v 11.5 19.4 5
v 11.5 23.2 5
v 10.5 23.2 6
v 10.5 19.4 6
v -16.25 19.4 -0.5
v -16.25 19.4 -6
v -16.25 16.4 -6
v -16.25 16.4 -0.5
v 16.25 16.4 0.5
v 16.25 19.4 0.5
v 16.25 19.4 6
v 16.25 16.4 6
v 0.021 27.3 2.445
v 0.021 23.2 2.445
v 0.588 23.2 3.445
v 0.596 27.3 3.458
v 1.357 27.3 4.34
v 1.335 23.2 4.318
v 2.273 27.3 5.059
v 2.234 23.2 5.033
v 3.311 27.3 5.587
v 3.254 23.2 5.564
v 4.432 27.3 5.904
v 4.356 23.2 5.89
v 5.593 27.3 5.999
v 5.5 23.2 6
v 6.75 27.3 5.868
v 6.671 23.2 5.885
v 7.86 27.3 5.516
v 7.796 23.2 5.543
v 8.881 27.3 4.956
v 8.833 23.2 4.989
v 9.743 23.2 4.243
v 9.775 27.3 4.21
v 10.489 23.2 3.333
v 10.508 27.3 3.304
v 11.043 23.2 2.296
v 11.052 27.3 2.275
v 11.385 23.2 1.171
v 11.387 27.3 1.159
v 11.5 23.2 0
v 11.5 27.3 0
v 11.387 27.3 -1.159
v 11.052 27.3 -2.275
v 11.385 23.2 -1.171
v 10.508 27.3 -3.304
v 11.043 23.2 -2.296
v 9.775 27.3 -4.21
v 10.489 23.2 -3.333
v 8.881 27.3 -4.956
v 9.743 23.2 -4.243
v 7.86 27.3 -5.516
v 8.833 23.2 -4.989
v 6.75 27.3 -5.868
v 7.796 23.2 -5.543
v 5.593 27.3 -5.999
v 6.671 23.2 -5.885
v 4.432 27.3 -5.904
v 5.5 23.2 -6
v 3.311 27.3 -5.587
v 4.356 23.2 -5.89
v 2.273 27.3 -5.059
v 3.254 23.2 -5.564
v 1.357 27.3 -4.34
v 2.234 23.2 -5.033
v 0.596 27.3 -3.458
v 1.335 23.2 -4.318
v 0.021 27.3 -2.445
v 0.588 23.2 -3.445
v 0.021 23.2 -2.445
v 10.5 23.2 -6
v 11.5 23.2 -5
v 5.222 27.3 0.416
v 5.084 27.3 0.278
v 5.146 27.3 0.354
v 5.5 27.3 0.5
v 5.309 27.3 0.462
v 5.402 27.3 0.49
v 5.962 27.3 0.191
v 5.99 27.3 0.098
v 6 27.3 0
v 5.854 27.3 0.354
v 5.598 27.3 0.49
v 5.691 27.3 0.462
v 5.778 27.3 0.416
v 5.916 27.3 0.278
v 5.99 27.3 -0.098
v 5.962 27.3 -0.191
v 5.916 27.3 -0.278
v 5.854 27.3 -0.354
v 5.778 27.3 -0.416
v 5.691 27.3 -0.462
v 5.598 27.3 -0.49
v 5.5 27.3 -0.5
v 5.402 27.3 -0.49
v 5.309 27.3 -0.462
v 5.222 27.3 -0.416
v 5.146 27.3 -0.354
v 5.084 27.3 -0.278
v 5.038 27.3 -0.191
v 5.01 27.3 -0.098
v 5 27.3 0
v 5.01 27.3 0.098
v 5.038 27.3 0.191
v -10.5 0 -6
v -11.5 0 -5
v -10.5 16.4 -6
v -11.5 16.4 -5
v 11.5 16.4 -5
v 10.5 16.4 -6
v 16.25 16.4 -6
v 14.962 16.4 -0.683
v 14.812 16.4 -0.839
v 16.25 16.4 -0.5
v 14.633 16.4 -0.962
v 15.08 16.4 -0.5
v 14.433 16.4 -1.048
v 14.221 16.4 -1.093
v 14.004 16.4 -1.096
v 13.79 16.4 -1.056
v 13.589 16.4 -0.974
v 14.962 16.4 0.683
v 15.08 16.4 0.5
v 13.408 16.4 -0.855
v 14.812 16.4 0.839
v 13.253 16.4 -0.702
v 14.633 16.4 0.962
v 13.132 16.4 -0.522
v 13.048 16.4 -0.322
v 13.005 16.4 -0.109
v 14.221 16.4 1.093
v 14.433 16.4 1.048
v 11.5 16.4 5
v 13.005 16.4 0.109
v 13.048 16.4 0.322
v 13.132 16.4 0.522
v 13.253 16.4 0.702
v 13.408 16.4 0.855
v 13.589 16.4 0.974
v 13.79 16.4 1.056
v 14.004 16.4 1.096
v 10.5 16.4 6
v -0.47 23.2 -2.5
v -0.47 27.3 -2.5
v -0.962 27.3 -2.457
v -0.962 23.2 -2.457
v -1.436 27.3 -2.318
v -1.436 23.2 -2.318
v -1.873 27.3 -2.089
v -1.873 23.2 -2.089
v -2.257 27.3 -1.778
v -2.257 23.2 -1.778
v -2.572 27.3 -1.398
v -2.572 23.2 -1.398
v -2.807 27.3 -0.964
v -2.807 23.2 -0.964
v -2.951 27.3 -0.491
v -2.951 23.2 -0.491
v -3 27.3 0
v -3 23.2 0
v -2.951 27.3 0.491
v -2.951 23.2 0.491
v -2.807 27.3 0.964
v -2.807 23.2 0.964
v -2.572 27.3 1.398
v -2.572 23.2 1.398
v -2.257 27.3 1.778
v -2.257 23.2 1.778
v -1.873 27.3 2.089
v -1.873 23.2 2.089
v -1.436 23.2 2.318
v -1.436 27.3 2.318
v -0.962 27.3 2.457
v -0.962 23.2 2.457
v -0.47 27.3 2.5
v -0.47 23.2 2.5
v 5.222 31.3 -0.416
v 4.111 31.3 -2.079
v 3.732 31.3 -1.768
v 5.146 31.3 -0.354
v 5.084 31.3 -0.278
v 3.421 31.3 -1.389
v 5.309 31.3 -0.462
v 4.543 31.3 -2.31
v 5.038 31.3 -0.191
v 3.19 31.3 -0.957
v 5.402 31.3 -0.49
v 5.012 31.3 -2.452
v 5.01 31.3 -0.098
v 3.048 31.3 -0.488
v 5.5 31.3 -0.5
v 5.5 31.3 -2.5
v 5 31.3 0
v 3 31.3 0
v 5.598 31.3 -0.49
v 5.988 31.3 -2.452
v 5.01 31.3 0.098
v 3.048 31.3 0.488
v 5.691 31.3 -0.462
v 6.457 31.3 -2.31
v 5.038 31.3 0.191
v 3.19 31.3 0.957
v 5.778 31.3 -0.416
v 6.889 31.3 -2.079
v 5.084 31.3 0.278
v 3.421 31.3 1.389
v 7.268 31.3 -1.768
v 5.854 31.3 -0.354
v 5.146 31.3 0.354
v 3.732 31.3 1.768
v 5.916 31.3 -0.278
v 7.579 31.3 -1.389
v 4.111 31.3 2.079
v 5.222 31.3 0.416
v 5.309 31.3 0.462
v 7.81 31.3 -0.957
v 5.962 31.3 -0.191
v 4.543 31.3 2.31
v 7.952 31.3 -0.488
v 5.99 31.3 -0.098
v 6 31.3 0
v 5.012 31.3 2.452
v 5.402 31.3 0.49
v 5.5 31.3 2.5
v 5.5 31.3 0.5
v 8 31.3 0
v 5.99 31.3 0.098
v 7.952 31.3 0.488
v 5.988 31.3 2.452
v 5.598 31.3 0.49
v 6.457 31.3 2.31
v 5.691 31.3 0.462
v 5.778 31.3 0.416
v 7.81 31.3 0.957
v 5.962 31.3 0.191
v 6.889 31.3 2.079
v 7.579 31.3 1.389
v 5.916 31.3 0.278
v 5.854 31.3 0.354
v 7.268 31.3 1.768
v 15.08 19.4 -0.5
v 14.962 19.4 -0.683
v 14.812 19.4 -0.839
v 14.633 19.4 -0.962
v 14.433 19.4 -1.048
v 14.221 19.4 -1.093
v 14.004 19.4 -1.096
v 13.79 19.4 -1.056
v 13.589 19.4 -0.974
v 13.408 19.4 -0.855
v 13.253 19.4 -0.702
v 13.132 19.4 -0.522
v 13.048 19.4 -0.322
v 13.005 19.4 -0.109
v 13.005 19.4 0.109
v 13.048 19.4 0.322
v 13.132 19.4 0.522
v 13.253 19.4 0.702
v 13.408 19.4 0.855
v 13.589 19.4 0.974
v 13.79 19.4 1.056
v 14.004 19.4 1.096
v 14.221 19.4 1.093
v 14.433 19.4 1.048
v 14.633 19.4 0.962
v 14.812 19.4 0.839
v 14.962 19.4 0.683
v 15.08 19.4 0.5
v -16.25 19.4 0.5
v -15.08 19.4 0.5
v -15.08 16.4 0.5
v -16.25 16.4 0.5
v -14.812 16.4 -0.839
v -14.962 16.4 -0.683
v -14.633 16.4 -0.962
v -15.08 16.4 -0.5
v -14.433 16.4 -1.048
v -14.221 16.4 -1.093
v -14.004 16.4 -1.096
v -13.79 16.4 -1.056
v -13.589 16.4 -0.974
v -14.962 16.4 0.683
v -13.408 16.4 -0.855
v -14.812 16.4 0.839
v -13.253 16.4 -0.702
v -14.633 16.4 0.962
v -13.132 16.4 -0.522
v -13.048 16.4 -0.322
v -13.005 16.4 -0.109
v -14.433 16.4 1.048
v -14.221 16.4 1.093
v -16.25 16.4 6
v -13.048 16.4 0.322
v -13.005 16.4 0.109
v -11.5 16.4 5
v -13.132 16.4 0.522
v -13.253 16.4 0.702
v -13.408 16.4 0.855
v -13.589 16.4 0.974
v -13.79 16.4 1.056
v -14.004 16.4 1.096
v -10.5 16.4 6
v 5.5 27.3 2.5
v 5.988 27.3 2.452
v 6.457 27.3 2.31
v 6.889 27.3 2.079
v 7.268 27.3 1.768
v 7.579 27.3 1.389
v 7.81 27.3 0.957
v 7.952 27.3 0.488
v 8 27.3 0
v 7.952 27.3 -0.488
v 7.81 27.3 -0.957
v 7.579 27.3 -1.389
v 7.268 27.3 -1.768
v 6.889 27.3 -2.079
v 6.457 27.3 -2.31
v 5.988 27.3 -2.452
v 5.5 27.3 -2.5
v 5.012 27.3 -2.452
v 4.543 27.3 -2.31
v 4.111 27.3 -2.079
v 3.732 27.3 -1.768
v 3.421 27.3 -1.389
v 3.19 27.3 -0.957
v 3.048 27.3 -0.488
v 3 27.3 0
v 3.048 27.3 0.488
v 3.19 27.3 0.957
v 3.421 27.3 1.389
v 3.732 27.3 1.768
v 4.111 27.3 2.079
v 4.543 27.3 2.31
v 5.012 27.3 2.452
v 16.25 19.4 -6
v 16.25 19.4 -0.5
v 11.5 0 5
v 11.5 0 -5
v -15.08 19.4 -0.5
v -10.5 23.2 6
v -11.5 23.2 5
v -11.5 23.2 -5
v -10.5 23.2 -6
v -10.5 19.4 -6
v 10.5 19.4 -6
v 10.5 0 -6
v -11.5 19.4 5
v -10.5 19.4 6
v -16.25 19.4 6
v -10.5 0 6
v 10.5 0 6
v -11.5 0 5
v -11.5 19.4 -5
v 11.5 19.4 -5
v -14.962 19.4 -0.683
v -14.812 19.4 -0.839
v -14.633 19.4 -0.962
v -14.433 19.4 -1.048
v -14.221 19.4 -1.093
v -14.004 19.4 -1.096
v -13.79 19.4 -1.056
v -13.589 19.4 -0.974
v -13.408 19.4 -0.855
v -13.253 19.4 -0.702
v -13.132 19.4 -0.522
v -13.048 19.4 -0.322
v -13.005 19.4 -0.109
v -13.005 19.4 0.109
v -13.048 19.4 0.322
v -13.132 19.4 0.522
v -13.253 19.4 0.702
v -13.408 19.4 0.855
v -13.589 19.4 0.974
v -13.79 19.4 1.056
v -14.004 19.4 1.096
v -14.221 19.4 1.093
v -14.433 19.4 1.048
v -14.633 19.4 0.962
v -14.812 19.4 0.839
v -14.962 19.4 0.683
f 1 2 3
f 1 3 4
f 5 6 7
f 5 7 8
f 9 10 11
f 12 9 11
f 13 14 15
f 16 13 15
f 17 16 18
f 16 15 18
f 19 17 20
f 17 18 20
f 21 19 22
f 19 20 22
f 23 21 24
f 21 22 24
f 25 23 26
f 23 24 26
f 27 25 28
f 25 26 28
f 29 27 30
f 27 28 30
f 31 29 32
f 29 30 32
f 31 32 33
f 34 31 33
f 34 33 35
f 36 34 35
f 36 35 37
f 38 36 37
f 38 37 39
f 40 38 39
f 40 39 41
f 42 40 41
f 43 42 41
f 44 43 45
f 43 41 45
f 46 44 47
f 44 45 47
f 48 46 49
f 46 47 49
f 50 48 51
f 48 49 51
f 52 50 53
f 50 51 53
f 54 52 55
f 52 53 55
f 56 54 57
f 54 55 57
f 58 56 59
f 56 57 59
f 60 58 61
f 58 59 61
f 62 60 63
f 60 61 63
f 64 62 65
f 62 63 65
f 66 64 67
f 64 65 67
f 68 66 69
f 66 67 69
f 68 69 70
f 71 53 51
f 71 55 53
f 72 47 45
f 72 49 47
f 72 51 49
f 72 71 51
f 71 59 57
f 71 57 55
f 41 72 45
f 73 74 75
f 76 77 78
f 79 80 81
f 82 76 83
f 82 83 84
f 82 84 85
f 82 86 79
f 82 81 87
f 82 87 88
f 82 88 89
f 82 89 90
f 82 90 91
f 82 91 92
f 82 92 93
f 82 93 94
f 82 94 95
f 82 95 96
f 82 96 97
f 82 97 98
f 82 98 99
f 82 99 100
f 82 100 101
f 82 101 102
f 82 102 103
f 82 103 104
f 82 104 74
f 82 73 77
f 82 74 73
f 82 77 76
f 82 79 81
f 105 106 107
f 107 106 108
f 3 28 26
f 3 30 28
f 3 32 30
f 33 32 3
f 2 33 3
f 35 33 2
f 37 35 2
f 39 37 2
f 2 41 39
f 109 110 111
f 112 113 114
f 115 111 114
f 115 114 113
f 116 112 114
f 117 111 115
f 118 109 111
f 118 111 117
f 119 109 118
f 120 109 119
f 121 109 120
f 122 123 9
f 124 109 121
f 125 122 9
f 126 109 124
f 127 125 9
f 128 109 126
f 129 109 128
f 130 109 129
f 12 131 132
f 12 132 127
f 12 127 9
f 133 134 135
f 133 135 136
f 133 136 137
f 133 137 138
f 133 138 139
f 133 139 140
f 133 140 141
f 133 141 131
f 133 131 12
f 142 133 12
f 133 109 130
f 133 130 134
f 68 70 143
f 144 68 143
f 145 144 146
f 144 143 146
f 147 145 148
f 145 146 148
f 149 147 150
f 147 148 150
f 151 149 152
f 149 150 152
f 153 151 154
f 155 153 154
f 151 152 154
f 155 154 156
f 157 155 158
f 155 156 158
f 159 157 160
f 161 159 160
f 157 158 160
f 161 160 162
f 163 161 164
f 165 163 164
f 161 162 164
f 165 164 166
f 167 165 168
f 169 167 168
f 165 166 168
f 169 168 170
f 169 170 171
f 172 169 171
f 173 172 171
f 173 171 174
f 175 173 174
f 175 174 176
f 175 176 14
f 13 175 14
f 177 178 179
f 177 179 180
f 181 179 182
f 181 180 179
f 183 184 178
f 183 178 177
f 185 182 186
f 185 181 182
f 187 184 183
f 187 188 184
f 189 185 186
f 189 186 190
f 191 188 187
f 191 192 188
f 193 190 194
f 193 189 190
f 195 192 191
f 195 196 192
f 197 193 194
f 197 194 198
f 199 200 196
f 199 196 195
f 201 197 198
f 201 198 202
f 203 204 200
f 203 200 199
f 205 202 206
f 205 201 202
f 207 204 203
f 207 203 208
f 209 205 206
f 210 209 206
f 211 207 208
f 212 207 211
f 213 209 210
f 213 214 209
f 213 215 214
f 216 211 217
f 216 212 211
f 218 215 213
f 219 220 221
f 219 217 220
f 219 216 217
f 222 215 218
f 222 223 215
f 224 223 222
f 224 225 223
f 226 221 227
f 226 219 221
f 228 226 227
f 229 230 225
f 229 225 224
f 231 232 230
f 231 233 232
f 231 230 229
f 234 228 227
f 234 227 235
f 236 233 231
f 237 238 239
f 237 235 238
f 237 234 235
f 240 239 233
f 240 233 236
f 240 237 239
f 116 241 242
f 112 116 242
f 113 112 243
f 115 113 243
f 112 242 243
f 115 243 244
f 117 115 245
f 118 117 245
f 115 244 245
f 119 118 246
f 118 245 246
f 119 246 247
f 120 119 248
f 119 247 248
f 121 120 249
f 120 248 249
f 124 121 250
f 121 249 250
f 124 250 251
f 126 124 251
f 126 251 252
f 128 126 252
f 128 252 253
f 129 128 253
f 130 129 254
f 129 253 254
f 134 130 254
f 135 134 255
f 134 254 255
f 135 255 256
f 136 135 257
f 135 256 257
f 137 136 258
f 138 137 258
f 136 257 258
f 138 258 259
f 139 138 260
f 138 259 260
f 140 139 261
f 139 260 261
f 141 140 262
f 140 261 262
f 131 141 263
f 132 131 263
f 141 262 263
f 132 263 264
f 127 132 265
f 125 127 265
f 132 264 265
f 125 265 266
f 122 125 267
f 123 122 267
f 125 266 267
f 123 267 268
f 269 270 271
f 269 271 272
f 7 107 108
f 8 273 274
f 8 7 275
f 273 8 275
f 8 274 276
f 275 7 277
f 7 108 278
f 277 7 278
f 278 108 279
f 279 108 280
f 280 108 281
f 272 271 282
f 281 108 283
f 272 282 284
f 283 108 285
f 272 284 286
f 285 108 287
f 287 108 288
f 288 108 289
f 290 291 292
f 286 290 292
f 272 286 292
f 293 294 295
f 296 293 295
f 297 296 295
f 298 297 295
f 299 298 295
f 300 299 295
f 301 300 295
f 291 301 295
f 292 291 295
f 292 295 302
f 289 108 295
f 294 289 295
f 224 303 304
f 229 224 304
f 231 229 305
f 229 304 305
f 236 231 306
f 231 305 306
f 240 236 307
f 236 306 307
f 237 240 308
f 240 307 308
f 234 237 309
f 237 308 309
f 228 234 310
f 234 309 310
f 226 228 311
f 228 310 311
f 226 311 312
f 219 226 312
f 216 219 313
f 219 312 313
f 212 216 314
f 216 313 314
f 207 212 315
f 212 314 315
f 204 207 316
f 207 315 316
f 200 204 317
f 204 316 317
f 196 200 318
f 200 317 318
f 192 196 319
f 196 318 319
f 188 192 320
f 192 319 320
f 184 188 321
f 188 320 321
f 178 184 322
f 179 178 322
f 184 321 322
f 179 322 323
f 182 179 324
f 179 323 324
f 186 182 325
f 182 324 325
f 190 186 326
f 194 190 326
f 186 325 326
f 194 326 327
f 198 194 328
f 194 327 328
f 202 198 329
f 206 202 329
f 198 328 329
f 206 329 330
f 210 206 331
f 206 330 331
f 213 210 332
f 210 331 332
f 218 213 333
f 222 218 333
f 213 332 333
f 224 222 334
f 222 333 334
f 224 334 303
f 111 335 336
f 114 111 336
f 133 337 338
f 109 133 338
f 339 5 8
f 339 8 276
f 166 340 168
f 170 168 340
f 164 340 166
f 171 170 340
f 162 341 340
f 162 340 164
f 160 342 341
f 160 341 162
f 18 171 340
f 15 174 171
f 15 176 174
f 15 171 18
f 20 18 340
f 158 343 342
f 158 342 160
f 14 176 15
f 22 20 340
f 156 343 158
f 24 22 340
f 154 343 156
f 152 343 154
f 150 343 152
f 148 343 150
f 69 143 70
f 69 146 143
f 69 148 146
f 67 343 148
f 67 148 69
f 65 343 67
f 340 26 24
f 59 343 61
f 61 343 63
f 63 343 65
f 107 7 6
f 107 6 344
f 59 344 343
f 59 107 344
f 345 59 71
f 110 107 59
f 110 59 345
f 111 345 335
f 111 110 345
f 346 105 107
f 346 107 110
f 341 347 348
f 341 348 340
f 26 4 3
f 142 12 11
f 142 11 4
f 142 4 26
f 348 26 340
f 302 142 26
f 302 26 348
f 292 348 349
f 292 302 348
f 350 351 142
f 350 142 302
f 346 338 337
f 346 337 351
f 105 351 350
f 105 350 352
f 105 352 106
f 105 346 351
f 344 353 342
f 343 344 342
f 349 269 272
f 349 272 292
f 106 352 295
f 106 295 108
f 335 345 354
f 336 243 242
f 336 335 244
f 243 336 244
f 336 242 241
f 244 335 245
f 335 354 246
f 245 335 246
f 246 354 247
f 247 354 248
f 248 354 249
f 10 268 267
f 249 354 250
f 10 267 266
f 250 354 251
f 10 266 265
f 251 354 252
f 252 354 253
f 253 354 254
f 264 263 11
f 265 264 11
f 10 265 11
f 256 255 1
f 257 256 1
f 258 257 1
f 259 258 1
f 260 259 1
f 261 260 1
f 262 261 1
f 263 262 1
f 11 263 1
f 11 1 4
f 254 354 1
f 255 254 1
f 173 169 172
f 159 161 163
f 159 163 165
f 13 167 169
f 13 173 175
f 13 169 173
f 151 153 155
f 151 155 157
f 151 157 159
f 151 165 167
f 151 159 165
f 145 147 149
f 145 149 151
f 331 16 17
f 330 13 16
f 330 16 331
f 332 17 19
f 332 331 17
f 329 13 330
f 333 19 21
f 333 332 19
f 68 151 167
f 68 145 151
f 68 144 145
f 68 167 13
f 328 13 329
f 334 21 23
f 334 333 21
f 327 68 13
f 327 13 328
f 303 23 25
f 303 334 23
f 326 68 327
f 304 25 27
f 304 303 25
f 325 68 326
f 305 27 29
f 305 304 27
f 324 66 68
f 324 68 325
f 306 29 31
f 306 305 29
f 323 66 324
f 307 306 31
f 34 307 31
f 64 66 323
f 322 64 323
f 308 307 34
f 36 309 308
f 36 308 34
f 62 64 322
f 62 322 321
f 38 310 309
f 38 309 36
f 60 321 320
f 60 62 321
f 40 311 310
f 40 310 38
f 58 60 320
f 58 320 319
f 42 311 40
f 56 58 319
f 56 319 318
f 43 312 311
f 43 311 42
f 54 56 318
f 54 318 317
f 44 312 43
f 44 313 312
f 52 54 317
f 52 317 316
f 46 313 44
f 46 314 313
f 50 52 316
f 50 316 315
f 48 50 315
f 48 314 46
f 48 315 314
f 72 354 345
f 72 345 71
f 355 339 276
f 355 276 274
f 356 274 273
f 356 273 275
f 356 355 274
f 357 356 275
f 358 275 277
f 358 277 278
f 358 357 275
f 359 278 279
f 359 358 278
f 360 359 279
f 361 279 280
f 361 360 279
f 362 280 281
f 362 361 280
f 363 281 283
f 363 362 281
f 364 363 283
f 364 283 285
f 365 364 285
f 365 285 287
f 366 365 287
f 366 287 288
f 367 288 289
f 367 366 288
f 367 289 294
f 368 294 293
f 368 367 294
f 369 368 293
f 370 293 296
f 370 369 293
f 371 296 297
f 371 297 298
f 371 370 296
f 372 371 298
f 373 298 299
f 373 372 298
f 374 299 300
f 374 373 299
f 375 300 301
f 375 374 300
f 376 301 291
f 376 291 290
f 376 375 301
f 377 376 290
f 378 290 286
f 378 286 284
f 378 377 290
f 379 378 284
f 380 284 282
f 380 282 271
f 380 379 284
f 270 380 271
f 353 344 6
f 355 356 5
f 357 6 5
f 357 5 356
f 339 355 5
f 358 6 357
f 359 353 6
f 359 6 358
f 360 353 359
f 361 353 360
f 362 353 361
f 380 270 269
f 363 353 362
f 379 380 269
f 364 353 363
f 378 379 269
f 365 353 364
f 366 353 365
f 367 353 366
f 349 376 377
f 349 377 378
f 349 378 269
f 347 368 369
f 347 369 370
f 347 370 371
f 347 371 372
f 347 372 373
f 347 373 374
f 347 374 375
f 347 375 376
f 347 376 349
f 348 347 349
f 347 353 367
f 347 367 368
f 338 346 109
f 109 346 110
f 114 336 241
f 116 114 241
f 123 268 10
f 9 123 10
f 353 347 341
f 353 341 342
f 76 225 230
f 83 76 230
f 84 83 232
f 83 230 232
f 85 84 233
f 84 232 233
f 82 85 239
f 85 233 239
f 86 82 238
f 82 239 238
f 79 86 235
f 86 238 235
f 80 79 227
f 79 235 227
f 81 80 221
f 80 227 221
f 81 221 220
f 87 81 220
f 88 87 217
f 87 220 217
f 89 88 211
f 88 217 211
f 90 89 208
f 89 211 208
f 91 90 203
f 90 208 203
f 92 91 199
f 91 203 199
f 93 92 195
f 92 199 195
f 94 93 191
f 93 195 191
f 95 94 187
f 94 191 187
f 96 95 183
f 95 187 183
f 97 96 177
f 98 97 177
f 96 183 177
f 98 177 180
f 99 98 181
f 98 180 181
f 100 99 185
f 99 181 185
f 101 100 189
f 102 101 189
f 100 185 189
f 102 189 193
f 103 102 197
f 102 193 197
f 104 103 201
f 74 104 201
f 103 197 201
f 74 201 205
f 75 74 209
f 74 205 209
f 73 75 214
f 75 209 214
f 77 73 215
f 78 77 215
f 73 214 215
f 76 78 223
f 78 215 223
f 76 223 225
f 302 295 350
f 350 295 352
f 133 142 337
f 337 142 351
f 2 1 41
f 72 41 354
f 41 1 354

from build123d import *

# Parameters (mm, degrees)
CROQUIS1_W              = 23
CROQUIS1_H              = 12
SALIENTE_EXTRUIR1_DEPTH = 23.2
CROQUIS6_R              = 2
CORTAR_EXTRUIR1_DEPTH   = 0.5
SALIENTE_EXTRUIR3_DEPTH = 4.1
CROQUIS8_R              = 2.5
SALIENTE_EXTRUIR4_DEPTH = 4
CROQUIS9_R              = 0.5
CORTAR_EXTRUIR2_DEPTH   = 4
CROQUIS11_W             = 12
CROQUIS11_H             = 3
SALIENTE_EXTRUIR5_DEPTH = 4.75
CORTAR_EXTRUIR3_DEPTH   = 3
CHAFL_N3_SIZE           = 1


with BuildPart() as part:
    # Croquis1 → Saliente-Extruir1 (new body)
    with BuildSketch(Plane(origin=(0, 0, 0), x_dir=(1, 0, 0), z_dir=(0, 1, 0))):
        Rectangle(CROQUIS1_W, CROQUIS1_H)
    saliente_extruir1 = extrude(amount=SALIENTE_EXTRUIR1_DEPTH)

    # Croquis6 → Cortar-Extruir1 (cut)
    with BuildSketch(Plane.XZ):
        with Locations((-11.5, 6)):
            Circle(CROQUIS6_R)
        with Locations((11.5, 6)):
            Circle(CROQUIS6_R)
        with Locations((-11.5, -6)):
            Circle(CROQUIS6_R)
        with Locations((11.5, -6)):
            Circle(CROQUIS6_R)
    extrude(amount=-CORTAR_EXTRUIR1_DEPTH, mode=Mode.SUBTRACT)

    # Croquis7 → Saliente-Extruir3 (add)
    with BuildSketch(Plane(origin=(0, 23.2, 0), x_dir=(1, 0, 0), z_dir=(0, 1, 0))):
        with BuildLine():
            ThreePointArc((0.020833333, -2.445144707), (11.5, 0), (0.020833333, 2.445144707))
            ThreePointArc((0.020833333, 2.445144707), (-3, 0), (0.020833333, -2.445144707))
        make_face()
    extrude(amount=SALIENTE_EXTRUIR3_DEPTH)

    # Croquis8 → Saliente-Extruir4 (add)
    with BuildSketch(Plane(origin=(0, 27.3, 0), x_dir=(1, 0, 0), z_dir=(0, 1, 0))):
        with Locations(Location((5.5, 0, 0), (0, 0, 270))):
            Circle(CROQUIS8_R)
    extrude(amount=SALIENTE_EXTRUIR4_DEPTH)

    # Croquis9 → Cortar-Extruir2 (cut)
    with BuildSketch(Plane(origin=(0, 31.3, 0), x_dir=(1, 0, 0), z_dir=(0, 1, 0))):
        with Locations(Location((5.5, 0, 0), (0, 0, 270))):
            Circle(CROQUIS9_R)
    extrude(amount=-CORTAR_EXTRUIR2_DEPTH, mode=Mode.SUBTRACT)

    # Croquis11 → Saliente-Extruir5 (add)
    with BuildSketch(Plane.ZY.offset(11.5)):
        with Locations((0, 17.89988551)):
            Rectangle(CROQUIS11_W, CROQUIS11_H)
    saliente_extruir5 = extrude(amount=SALIENTE_EXTRUIR5_DEPTH)

    # Croquis12 → Cortar-Extruir3 (cut)
    with BuildSketch(Plane(origin=(0, 19.39988551, 0), x_dir=(1, 0, 0), z_dir=(0, 1, 0))):
        with BuildLine():
            Line((-16.25, 0.5), (-15.079795897, 0.5))
            ThreePointArc((-15.079795897, 0.5), (-13, 0), (-15.079795897, -0.5))
            Line((-15.079795897, -0.5), (-16.25, -0.5))
            Line((-16.25, -0.5), (-16.25, 0.5))
        make_face()
    cortar_extruir3 = extrude(amount=-CORTAR_EXTRUIR3_DEPTH, mode=Mode.SUBTRACT)

    # Simetría1: Saliente-Extruir1, Saliente-Extruir5, Cortar-Extruir3 across plane
    add(saliente_extruir1.mirror(Plane.ZY))
    add(saliente_extruir5.mirror(Plane.ZY))
    add(cortar_extruir3.mirror(Plane.ZY), mode=Mode.SUBTRACT)

    # Chaflán3
    chafl_n3_edges = [part.edges().sort_by_distance(p)[0] for p in [
        (11.5, 8.199942755, -6),
        (11.5, 8.199942755, 6),
        (-11.5, 8.199942755, 6),
        (-11.5, 8.199942755, -6),
        (-11.5, 21.299942755, -6),
        (11.5, 21.299942755, -6),
        (11.5, 21.299942755, 6),
        (-11.5, 21.299942755, 6),
    ]]
    chamfer(chafl_n3_edges, length=CHAFL_N3_SIZE)


solid = part.part
